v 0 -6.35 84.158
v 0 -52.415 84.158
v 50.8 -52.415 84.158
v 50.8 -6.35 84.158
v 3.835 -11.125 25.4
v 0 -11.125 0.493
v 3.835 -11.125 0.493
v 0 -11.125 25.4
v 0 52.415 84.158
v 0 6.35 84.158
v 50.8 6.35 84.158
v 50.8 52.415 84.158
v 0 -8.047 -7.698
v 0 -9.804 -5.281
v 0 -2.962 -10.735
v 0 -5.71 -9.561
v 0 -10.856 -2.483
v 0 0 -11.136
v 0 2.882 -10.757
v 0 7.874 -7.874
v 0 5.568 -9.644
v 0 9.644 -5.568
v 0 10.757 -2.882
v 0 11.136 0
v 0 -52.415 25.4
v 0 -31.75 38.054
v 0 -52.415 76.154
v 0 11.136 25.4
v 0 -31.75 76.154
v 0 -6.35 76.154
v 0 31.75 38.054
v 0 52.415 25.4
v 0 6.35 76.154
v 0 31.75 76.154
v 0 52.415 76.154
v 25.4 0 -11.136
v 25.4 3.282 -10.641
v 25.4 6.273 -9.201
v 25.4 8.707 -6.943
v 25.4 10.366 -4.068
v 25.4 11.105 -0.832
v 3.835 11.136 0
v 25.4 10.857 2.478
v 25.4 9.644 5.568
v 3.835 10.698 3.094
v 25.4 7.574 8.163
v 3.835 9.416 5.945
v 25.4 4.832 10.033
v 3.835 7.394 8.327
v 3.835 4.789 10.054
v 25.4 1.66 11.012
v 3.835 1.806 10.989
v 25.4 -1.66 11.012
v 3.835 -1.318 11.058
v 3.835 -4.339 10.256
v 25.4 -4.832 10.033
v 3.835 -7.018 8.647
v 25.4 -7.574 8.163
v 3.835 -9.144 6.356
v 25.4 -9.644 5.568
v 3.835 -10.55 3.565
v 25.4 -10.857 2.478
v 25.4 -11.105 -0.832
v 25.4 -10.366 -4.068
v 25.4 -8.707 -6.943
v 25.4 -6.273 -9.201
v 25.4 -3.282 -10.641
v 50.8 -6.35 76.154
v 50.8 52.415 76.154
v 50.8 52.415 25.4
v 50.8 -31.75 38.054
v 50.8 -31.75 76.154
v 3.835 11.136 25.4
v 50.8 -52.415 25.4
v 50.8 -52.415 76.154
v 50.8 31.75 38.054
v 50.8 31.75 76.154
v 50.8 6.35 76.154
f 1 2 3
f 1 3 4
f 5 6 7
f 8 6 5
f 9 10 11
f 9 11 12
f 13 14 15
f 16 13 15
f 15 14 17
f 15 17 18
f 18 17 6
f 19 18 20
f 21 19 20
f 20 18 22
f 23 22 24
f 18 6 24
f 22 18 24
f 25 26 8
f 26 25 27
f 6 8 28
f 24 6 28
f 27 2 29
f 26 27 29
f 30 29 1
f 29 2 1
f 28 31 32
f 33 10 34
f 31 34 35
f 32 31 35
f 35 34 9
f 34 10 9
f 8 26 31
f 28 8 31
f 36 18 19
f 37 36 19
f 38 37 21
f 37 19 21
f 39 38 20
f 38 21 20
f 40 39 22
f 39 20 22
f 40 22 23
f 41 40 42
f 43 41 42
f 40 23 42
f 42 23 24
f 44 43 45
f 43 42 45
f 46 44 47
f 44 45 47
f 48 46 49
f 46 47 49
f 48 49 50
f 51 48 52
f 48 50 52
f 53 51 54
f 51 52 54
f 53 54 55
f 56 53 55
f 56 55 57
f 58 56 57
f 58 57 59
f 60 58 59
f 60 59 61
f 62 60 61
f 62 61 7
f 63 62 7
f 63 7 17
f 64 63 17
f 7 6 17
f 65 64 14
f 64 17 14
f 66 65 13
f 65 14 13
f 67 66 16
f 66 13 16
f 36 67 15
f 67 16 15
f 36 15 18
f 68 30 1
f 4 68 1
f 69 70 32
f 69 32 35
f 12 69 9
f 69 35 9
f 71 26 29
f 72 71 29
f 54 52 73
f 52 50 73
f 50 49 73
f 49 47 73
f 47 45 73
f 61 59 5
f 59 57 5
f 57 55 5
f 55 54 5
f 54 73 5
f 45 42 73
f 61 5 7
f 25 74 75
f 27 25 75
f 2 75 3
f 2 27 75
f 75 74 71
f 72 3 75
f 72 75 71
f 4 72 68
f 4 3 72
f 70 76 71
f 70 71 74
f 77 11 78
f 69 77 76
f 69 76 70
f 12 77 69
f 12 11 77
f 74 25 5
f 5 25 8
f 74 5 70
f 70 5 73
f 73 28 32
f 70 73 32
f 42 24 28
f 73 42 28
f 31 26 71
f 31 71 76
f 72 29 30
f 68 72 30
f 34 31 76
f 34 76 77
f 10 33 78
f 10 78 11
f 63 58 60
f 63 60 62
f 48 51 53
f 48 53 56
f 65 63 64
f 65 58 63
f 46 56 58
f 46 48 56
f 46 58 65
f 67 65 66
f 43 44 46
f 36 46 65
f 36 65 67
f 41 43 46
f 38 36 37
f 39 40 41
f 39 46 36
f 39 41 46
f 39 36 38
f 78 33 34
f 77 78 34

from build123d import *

# Parameters (mm, degrees)
SKETCH1_R           = 11.136121628
BOSS_EXTRUDE1_DEPTH = 25.4
SKETCH2_W           = 22.261321628
SKETCH2_H           = 25.4
BOSS_EXTRUDE2_DEPTH = 3.834635566
SKETCH3_W           = 63.5
SKETCH3_H           = 12.654490516
BOSS_EXTRUDE3_DEPTH = 50.8
SKETCH4_W           = 20.664696479
SKETCH4_H           = 50.754490516
BOSS_EXTRUDE4_DEPTH = 50.8
SKETCH5_W           = 46.064696479
SKETCH5_H           = 8.003402532
BOSS_EXTRUDE5_DEPTH = 50.8


with BuildPart() as part:
    # Sketch1 → Boss-Extrude1 (new body)
    with BuildSketch(Plane.YZ):
        with Locations(Location((0, 0, 0), (0, 0, 270))):
            Circle(SKETCH1_R)
    extrude(amount=BOSS_EXTRUDE1_DEPTH)

    # Sketch2 → Boss-Extrude2 (add)
    with BuildSketch(Plane(origin=(0, 0, 0), x_dir=(0, -1, 0), z_dir=(-1, 0, 0))):
        with Locations((-0.005460814, 12.7)):
            Rectangle(SKETCH2_W, SKETCH2_H)
    extrude(amount=-BOSS_EXTRUDE2_DEPTH)

    # Sketch3 → Boss-Extrude3 (add)
    with BuildSketch(Plane.YZ):
        with Locations((0, 31.727245258)):
            Rectangle(SKETCH3_W, SKETCH3_H)
    extrude(amount=BOSS_EXTRUDE3_DEPTH)

    # Sketch4 → Boss-Extrude4 (add)
    with BuildSketch(Plane.YZ):
        with Locations((-42.082348239, 50.777245258)):
            Rectangle(SKETCH4_W, SKETCH4_H)
        with Locations((42.082348239, 50.777245258)):
            Rectangle(SKETCH4_W, SKETCH4_H)
    extrude(amount=BOSS_EXTRUDE4_DEPTH)

    # Sketch5 → Boss-Extrude5 (add)
    with BuildSketch(Plane.YZ):
        with Locations((-29.38234824, 80.156191782)):
            Rectangle(SKETCH5_W, SKETCH5_H)
        with Locations((29.38234824, 80.156191782)):
            Rectangle(SKETCH5_W, SKETCH5_H)
    extrude(amount=BOSS_EXTRUDE5_DEPTH)


solid = part.part
